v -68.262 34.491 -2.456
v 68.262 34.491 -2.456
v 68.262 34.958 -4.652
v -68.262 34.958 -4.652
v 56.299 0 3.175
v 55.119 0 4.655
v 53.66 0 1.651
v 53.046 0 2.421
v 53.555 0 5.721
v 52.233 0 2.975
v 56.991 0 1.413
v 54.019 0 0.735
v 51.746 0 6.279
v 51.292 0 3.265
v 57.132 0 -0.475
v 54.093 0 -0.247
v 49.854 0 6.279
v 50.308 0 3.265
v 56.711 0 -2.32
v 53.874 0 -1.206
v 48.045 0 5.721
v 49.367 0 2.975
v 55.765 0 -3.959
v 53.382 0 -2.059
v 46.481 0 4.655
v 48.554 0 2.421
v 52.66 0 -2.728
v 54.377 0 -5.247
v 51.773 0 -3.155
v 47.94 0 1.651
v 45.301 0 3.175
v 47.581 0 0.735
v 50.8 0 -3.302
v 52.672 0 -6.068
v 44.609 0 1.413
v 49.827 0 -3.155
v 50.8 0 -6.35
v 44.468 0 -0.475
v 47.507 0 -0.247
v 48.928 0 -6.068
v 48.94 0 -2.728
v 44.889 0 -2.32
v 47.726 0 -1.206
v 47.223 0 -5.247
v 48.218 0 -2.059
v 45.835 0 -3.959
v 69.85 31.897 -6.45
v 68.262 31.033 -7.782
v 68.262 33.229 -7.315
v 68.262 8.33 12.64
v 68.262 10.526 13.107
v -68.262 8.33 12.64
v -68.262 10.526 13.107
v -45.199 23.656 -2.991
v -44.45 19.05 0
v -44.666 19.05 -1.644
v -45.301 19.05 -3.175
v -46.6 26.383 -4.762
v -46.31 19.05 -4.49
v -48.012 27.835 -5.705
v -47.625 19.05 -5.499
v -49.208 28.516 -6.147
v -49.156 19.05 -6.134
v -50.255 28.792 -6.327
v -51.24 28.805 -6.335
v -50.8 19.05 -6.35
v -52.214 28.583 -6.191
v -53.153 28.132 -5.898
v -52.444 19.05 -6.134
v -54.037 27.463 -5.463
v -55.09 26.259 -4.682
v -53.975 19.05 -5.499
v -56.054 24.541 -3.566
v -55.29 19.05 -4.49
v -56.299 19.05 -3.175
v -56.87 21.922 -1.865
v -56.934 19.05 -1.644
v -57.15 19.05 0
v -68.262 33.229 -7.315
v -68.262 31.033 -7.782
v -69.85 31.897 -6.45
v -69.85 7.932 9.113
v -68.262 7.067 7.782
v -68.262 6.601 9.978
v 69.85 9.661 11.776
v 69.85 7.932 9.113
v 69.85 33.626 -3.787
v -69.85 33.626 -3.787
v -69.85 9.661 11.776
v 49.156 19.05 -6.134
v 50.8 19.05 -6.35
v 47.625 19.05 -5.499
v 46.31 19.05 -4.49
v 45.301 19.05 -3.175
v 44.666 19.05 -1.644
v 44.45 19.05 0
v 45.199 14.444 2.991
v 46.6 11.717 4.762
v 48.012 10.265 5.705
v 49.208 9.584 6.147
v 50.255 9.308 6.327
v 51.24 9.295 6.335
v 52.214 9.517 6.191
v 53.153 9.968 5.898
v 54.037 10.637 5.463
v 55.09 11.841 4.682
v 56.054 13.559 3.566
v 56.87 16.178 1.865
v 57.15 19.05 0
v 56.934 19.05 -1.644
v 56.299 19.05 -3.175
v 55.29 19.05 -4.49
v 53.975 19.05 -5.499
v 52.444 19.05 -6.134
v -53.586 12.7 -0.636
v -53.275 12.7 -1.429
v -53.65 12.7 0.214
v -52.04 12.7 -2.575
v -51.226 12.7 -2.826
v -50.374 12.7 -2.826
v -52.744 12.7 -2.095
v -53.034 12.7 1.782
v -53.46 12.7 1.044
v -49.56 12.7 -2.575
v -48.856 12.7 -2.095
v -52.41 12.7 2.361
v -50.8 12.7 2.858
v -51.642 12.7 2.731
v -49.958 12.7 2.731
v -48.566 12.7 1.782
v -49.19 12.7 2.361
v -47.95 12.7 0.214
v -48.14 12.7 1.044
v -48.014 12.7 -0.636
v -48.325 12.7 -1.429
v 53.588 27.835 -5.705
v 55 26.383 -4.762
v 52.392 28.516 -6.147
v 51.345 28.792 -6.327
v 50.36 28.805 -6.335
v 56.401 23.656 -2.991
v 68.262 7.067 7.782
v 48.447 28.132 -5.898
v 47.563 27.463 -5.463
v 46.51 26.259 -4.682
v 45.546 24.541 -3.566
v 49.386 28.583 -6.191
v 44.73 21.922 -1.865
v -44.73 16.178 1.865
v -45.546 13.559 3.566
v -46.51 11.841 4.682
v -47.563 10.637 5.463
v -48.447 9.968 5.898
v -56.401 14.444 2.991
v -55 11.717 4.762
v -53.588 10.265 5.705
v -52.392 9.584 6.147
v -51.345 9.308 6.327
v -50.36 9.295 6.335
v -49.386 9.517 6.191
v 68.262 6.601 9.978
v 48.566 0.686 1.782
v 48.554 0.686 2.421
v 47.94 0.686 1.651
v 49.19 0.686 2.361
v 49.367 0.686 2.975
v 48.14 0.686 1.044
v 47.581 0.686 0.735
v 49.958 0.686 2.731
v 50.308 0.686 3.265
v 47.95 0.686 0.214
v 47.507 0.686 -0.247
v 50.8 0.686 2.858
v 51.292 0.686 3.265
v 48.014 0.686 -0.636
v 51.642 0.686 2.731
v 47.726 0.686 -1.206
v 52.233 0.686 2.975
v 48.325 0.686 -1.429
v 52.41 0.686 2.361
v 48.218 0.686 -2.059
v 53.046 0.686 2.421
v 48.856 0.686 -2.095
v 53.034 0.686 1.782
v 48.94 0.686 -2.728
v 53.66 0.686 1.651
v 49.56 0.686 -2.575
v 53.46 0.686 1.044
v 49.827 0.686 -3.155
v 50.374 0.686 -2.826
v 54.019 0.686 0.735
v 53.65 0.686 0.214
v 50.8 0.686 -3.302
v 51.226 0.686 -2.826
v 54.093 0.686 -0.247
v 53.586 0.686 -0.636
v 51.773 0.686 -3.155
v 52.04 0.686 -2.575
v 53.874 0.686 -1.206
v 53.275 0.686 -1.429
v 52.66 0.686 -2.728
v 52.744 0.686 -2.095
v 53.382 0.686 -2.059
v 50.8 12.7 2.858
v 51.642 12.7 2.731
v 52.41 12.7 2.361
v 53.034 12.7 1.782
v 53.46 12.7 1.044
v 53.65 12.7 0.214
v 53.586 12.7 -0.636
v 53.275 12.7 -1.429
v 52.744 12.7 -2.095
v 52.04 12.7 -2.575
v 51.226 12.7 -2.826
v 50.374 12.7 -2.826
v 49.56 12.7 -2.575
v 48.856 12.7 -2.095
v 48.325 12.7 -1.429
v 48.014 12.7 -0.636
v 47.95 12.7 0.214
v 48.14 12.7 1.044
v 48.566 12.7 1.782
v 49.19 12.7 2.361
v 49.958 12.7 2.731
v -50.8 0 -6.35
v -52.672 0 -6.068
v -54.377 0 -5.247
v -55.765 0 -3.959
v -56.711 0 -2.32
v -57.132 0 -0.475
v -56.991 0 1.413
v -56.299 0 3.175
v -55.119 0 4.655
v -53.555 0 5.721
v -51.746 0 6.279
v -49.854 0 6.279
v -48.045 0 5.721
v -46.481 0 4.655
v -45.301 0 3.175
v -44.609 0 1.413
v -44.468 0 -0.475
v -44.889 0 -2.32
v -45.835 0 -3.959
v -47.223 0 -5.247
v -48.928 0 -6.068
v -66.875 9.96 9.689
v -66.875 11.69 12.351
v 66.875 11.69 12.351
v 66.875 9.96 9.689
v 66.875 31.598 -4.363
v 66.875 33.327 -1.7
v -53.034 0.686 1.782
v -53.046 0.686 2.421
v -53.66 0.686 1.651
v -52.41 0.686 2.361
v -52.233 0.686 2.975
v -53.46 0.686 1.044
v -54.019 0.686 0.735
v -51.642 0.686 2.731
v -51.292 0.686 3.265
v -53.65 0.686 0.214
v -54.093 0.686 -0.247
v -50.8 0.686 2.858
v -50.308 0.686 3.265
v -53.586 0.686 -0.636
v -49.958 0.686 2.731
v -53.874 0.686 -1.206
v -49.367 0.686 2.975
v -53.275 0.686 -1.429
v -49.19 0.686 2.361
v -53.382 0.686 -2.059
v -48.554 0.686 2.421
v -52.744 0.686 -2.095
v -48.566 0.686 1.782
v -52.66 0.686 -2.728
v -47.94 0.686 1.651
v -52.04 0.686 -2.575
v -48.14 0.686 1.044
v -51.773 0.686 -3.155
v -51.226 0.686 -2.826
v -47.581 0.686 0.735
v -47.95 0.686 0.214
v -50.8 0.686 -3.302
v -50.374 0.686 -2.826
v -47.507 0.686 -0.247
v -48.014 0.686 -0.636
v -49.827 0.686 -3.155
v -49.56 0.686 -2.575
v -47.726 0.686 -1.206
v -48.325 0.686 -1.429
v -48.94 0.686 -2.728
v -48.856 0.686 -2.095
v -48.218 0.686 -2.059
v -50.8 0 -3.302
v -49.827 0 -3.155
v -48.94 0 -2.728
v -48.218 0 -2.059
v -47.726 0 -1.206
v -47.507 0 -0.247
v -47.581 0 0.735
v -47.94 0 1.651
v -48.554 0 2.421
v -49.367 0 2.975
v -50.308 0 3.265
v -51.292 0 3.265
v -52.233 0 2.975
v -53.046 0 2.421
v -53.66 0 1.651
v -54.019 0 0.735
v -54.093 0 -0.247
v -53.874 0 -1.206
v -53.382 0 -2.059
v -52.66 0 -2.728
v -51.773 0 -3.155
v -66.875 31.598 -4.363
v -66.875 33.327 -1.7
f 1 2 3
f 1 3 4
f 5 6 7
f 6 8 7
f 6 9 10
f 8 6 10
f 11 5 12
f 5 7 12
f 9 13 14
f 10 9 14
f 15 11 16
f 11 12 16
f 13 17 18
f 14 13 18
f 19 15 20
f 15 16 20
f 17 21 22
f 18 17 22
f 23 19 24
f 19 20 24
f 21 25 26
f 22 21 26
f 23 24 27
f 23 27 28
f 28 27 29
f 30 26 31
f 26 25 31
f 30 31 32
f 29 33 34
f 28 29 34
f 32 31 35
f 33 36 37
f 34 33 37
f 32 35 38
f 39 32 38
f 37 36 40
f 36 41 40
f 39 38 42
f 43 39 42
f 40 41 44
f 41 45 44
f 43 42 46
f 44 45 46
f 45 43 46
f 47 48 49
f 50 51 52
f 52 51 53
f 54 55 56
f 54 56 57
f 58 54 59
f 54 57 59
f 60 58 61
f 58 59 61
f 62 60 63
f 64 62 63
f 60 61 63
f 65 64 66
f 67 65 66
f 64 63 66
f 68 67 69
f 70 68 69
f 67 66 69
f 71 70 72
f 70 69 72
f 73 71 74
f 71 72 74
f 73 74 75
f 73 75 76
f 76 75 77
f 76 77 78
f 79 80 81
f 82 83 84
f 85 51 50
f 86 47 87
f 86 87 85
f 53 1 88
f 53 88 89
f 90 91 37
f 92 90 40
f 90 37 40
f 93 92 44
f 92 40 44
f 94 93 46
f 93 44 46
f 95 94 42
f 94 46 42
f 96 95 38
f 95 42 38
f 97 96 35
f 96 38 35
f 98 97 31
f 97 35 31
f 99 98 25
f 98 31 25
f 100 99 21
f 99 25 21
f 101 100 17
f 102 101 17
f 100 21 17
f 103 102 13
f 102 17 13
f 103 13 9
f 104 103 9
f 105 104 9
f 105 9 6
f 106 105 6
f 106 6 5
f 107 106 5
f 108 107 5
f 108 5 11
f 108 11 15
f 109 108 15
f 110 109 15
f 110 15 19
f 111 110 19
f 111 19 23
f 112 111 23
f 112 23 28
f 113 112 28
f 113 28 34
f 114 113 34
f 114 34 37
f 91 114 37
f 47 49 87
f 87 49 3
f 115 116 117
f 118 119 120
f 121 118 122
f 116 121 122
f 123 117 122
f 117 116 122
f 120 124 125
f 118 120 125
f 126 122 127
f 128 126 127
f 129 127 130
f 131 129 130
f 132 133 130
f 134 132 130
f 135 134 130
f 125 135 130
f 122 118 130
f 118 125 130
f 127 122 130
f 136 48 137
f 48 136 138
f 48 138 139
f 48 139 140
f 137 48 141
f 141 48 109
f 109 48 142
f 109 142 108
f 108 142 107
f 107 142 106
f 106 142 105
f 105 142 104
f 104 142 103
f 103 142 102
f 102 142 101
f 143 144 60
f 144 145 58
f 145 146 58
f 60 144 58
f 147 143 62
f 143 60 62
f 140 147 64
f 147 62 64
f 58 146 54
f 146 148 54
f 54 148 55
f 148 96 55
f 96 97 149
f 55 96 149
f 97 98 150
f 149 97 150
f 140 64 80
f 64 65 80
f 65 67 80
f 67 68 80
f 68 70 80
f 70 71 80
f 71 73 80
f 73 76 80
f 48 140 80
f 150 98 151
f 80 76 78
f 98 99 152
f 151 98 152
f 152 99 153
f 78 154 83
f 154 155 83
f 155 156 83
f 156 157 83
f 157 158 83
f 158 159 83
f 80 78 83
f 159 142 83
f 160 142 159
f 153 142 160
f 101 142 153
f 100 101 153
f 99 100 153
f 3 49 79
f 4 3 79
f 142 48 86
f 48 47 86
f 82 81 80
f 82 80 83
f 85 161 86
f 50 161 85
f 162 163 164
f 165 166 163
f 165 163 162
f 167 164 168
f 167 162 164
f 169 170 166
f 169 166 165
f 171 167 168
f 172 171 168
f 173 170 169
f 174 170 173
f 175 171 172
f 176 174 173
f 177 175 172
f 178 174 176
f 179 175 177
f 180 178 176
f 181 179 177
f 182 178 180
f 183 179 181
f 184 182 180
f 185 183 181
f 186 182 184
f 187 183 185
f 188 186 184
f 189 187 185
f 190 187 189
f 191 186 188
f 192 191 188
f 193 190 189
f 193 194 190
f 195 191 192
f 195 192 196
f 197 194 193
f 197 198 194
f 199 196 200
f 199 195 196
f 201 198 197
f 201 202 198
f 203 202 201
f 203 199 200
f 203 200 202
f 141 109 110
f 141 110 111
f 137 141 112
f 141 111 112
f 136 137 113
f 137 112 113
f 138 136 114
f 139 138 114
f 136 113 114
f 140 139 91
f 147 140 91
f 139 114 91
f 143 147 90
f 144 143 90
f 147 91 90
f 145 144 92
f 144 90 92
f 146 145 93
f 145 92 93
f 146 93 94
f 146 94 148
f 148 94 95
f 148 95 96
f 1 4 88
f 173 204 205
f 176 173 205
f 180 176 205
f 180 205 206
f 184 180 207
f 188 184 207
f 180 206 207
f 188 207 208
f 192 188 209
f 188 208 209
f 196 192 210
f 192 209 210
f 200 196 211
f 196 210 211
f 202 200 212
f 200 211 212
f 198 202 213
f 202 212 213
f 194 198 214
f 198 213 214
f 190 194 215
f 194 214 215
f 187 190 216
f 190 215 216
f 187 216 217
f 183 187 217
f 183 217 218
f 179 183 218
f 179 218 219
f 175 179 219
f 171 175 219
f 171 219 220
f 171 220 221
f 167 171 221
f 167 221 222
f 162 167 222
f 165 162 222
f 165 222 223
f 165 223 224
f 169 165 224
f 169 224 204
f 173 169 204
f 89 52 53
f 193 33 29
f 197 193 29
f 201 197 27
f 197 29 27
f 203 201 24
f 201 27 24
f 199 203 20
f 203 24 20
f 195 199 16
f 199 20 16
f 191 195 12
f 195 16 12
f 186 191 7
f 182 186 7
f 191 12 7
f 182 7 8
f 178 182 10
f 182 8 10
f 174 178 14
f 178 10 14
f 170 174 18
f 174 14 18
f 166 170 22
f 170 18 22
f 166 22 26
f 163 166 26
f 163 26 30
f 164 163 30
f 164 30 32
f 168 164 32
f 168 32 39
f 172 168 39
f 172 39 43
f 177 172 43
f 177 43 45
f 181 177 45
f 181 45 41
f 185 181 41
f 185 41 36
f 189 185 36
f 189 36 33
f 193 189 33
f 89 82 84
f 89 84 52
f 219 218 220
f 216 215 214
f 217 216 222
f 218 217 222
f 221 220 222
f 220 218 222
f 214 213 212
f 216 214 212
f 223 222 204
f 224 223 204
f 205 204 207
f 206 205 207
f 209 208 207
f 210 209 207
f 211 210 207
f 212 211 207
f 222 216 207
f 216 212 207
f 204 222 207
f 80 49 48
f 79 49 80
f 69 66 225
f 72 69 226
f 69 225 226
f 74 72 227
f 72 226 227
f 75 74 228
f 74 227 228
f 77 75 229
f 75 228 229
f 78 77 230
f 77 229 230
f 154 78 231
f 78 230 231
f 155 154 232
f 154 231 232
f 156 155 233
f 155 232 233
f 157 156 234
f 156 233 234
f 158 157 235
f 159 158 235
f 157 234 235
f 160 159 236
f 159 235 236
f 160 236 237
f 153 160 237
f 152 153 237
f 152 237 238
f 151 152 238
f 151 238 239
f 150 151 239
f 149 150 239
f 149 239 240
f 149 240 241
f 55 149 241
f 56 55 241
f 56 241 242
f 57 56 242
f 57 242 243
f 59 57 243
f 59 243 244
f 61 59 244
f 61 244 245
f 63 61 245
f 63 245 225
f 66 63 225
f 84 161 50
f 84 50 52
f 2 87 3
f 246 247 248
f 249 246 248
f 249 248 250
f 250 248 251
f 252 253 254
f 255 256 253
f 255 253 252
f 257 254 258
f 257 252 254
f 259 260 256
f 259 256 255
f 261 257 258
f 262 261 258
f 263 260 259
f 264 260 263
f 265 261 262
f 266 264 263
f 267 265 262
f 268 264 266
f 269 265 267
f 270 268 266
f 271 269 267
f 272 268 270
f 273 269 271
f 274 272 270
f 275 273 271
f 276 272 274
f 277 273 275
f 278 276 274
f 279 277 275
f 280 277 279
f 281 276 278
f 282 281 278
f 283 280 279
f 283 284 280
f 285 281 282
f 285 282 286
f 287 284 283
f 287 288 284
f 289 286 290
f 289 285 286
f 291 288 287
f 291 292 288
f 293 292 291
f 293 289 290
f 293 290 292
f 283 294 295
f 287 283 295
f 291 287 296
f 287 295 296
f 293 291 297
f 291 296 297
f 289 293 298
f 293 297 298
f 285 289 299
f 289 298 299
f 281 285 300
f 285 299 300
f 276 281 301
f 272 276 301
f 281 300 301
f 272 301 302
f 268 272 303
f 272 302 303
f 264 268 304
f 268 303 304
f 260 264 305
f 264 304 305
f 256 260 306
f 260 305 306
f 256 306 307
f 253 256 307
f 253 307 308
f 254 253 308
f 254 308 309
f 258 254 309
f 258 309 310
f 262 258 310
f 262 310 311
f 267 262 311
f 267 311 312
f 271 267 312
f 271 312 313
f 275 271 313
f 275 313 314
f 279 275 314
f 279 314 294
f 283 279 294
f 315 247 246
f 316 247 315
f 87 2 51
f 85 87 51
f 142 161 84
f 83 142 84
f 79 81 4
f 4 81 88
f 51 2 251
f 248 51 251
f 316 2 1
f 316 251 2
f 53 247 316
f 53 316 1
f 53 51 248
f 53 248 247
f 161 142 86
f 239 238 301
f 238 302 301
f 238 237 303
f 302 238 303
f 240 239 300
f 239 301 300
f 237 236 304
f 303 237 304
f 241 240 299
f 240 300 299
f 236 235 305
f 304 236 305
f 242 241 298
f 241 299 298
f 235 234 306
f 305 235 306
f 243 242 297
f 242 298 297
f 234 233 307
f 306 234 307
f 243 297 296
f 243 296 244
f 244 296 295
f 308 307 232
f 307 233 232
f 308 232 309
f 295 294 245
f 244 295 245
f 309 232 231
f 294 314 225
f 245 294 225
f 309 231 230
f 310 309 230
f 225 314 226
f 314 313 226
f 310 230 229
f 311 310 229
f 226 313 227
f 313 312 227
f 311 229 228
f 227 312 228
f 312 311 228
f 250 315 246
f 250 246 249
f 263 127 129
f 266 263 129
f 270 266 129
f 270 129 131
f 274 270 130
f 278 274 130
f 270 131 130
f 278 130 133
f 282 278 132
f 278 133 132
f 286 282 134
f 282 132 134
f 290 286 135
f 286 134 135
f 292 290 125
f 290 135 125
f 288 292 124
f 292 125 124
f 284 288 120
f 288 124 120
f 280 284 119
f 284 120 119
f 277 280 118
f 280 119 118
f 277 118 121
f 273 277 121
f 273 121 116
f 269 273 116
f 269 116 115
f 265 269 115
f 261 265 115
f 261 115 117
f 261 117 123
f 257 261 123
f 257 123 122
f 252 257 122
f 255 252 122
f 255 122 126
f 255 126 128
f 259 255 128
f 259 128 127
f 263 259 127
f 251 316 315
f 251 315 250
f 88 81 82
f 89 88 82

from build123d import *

# Parameters (mm, degrees)
SKETCH2_R             = 6.35
BOSS_EXTRUDE1_DEPTH   = 19.05
BOSS_EXTRUDE1_2_DEPTH = 19.05
SKETCH3_W             = 139.7
SKETCH3_H             = 31.75
BOSS_EXTRUDE2_DEPTH   = 6.35
BOSS_EXTRUDE3_REACH   = 75.737
SKETCH9_W             = 133.75
SKETCH9_H             = 25.8
CUT_EXTRUDE1_DEPTH    = 3.175
CHAMFER2_SIZE         = 1.5875
HOLE1_D               = 5.715
HOLE1_DEPTH           = 12.7
HOLE1_CBORE_D         = 6.604
HOLE1_CBORE_DEPTH     = 0.6858


with BuildPart() as part:
    # Sketch2 → Boss-Extrude1 (new body)
    with BuildSketch(Plane(origin=(0, 0, 0), x_dir=(1, 0, 0), z_dir=(0, 1, 0))):
        with Locations((-50.8, 0)):
            Circle(SKETCH2_R)
    extrude(amount=BOSS_EXTRUDE1_DEPTH)



with BuildPart() as body_2:
    # Sketch2 → Boss-Extrude1 2 (new body)
    with BuildSketch(Plane(origin=(0, 0, 0), x_dir=(1, 0, 0), z_dir=(0, 1, 0))):
        with Locations((50.8, 0)):
            Circle(SKETCH2_R)
    extrude(amount=BOSS_EXTRUDE1_2_DEPTH)


with BuildPart() as part_1:
    add(part.part)

    add(body_2.part)  # Boss-Extrude2 merges body 2
    # Sketch3 → Boss-Extrude2 (add)
    with BuildSketch(Plane(origin=(0, 5.650833475, 8.701520484), x_dir=(-1, 0, 0), z_dir=(0, 0.5446390350150281, 0.8386705679454234))):
        with Locations((0, -15.976674319)):
            Rectangle(SKETCH3_W, SKETCH3_H)
    extrude(amount=BOSS_EXTRUDE2_DEPTH)

    # Sketch8 → Boss-Extrude3 (add, up to next)
    with BuildSketch(Plane(origin=(0, 19.05, 0), x_dir=(1, 0, 0), z_dir=(0, 1, 0)), mode=Mode.PRIVATE) as boss_extrude3_sk1:
        with BuildLine():
            ThreePointArc((57.15, 0), (50.8, 6.35), (44.45, 0))
            Line((44.45, 0), (57.15, 0))
        make_face()
    boss_extrude3_tool1 = extrude(boss_extrude3_sk1.sketch, amount=BOSS_EXTRUDE3_REACH, mode=Mode.PRIVATE) - part_1.part
    # Sketch8 → Boss-Extrude3 (add, up to next)
    with BuildSketch(Plane(origin=(0, 19.05, 0), x_dir=(1, 0, 0), z_dir=(0, 1, 0)), mode=Mode.PRIVATE) as boss_extrude3_sk2:
        with BuildLine():
            ThreePointArc((-44.45, 0), (-50.8, 6.35), (-57.15, 0))
            Line((-57.15, 0), (-44.45, 0))
        make_face()
    boss_extrude3_tool2 = extrude(boss_extrude3_sk2.sketch, amount=BOSS_EXTRUDE3_REACH, mode=Mode.PRIVATE) - part_1.part
    add(boss_extrude3_tool1.solids().sort_by_distance((50.8, 19.05, -2.695024))[0])
    add(boss_extrude3_tool2.solids().sort_by_distance((-50.8, 19.05, -2.695024))[0])

    # Sketch9 → Cut-Extrude1 (cut)
    with BuildSketch(Plane(origin=(0, 9.109291347, 14.02707859), x_dir=(1, 0, 0), z_dir=(0, 0.5446390350150282, 0.8386705679454234))):
        with Locations((0, 15.976674319)):
            Rectangle(SKETCH9_W, SKETCH9_H)
    extrude(amount=-CUT_EXTRUDE1_DEPTH, mode=Mode.SUBTRACT)

    # Chamfer2
    chamfer2_edges = [part_1.edges().sort_by_distance(p)[0] for p in [
        (-69.85, 19.05, 0),
        (0, 32.363895266, -8.646144681),
        (69.85, 19.05, 0),
        (0, 5.736104734, 8.646144681),
        (0, 9.194562606, 13.971702787),
        (-69.85, 7.46533367, 11.308923734),
        (-69.85, 22.508457872, 5.325558106),
        (69.85, 7.46533367, 11.308923734),
        (69.85, 22.508457872, 5.325558106),
        (69.85, 34.093124202, -5.983365628),
        (0, 35.822353138, -3.320586574),
        (-69.85, 34.093124202, -5.983365628),
    ]]
    chamfer(chamfer2_edges, length=CHAMFER2_SIZE)

    # Hole1
    with Locations(Plane(origin=(-50.8, 0, 0), x_dir=(0, 0, -1), z_dir=(0, -1, 0))):
        with Locations((0, 0), (0, 101.6)):
            CounterBoreHole(HOLE1_D / 2, HOLE1_CBORE_D / 2, HOLE1_CBORE_DEPTH, depth=HOLE1_DEPTH)


solid = part_1.part
